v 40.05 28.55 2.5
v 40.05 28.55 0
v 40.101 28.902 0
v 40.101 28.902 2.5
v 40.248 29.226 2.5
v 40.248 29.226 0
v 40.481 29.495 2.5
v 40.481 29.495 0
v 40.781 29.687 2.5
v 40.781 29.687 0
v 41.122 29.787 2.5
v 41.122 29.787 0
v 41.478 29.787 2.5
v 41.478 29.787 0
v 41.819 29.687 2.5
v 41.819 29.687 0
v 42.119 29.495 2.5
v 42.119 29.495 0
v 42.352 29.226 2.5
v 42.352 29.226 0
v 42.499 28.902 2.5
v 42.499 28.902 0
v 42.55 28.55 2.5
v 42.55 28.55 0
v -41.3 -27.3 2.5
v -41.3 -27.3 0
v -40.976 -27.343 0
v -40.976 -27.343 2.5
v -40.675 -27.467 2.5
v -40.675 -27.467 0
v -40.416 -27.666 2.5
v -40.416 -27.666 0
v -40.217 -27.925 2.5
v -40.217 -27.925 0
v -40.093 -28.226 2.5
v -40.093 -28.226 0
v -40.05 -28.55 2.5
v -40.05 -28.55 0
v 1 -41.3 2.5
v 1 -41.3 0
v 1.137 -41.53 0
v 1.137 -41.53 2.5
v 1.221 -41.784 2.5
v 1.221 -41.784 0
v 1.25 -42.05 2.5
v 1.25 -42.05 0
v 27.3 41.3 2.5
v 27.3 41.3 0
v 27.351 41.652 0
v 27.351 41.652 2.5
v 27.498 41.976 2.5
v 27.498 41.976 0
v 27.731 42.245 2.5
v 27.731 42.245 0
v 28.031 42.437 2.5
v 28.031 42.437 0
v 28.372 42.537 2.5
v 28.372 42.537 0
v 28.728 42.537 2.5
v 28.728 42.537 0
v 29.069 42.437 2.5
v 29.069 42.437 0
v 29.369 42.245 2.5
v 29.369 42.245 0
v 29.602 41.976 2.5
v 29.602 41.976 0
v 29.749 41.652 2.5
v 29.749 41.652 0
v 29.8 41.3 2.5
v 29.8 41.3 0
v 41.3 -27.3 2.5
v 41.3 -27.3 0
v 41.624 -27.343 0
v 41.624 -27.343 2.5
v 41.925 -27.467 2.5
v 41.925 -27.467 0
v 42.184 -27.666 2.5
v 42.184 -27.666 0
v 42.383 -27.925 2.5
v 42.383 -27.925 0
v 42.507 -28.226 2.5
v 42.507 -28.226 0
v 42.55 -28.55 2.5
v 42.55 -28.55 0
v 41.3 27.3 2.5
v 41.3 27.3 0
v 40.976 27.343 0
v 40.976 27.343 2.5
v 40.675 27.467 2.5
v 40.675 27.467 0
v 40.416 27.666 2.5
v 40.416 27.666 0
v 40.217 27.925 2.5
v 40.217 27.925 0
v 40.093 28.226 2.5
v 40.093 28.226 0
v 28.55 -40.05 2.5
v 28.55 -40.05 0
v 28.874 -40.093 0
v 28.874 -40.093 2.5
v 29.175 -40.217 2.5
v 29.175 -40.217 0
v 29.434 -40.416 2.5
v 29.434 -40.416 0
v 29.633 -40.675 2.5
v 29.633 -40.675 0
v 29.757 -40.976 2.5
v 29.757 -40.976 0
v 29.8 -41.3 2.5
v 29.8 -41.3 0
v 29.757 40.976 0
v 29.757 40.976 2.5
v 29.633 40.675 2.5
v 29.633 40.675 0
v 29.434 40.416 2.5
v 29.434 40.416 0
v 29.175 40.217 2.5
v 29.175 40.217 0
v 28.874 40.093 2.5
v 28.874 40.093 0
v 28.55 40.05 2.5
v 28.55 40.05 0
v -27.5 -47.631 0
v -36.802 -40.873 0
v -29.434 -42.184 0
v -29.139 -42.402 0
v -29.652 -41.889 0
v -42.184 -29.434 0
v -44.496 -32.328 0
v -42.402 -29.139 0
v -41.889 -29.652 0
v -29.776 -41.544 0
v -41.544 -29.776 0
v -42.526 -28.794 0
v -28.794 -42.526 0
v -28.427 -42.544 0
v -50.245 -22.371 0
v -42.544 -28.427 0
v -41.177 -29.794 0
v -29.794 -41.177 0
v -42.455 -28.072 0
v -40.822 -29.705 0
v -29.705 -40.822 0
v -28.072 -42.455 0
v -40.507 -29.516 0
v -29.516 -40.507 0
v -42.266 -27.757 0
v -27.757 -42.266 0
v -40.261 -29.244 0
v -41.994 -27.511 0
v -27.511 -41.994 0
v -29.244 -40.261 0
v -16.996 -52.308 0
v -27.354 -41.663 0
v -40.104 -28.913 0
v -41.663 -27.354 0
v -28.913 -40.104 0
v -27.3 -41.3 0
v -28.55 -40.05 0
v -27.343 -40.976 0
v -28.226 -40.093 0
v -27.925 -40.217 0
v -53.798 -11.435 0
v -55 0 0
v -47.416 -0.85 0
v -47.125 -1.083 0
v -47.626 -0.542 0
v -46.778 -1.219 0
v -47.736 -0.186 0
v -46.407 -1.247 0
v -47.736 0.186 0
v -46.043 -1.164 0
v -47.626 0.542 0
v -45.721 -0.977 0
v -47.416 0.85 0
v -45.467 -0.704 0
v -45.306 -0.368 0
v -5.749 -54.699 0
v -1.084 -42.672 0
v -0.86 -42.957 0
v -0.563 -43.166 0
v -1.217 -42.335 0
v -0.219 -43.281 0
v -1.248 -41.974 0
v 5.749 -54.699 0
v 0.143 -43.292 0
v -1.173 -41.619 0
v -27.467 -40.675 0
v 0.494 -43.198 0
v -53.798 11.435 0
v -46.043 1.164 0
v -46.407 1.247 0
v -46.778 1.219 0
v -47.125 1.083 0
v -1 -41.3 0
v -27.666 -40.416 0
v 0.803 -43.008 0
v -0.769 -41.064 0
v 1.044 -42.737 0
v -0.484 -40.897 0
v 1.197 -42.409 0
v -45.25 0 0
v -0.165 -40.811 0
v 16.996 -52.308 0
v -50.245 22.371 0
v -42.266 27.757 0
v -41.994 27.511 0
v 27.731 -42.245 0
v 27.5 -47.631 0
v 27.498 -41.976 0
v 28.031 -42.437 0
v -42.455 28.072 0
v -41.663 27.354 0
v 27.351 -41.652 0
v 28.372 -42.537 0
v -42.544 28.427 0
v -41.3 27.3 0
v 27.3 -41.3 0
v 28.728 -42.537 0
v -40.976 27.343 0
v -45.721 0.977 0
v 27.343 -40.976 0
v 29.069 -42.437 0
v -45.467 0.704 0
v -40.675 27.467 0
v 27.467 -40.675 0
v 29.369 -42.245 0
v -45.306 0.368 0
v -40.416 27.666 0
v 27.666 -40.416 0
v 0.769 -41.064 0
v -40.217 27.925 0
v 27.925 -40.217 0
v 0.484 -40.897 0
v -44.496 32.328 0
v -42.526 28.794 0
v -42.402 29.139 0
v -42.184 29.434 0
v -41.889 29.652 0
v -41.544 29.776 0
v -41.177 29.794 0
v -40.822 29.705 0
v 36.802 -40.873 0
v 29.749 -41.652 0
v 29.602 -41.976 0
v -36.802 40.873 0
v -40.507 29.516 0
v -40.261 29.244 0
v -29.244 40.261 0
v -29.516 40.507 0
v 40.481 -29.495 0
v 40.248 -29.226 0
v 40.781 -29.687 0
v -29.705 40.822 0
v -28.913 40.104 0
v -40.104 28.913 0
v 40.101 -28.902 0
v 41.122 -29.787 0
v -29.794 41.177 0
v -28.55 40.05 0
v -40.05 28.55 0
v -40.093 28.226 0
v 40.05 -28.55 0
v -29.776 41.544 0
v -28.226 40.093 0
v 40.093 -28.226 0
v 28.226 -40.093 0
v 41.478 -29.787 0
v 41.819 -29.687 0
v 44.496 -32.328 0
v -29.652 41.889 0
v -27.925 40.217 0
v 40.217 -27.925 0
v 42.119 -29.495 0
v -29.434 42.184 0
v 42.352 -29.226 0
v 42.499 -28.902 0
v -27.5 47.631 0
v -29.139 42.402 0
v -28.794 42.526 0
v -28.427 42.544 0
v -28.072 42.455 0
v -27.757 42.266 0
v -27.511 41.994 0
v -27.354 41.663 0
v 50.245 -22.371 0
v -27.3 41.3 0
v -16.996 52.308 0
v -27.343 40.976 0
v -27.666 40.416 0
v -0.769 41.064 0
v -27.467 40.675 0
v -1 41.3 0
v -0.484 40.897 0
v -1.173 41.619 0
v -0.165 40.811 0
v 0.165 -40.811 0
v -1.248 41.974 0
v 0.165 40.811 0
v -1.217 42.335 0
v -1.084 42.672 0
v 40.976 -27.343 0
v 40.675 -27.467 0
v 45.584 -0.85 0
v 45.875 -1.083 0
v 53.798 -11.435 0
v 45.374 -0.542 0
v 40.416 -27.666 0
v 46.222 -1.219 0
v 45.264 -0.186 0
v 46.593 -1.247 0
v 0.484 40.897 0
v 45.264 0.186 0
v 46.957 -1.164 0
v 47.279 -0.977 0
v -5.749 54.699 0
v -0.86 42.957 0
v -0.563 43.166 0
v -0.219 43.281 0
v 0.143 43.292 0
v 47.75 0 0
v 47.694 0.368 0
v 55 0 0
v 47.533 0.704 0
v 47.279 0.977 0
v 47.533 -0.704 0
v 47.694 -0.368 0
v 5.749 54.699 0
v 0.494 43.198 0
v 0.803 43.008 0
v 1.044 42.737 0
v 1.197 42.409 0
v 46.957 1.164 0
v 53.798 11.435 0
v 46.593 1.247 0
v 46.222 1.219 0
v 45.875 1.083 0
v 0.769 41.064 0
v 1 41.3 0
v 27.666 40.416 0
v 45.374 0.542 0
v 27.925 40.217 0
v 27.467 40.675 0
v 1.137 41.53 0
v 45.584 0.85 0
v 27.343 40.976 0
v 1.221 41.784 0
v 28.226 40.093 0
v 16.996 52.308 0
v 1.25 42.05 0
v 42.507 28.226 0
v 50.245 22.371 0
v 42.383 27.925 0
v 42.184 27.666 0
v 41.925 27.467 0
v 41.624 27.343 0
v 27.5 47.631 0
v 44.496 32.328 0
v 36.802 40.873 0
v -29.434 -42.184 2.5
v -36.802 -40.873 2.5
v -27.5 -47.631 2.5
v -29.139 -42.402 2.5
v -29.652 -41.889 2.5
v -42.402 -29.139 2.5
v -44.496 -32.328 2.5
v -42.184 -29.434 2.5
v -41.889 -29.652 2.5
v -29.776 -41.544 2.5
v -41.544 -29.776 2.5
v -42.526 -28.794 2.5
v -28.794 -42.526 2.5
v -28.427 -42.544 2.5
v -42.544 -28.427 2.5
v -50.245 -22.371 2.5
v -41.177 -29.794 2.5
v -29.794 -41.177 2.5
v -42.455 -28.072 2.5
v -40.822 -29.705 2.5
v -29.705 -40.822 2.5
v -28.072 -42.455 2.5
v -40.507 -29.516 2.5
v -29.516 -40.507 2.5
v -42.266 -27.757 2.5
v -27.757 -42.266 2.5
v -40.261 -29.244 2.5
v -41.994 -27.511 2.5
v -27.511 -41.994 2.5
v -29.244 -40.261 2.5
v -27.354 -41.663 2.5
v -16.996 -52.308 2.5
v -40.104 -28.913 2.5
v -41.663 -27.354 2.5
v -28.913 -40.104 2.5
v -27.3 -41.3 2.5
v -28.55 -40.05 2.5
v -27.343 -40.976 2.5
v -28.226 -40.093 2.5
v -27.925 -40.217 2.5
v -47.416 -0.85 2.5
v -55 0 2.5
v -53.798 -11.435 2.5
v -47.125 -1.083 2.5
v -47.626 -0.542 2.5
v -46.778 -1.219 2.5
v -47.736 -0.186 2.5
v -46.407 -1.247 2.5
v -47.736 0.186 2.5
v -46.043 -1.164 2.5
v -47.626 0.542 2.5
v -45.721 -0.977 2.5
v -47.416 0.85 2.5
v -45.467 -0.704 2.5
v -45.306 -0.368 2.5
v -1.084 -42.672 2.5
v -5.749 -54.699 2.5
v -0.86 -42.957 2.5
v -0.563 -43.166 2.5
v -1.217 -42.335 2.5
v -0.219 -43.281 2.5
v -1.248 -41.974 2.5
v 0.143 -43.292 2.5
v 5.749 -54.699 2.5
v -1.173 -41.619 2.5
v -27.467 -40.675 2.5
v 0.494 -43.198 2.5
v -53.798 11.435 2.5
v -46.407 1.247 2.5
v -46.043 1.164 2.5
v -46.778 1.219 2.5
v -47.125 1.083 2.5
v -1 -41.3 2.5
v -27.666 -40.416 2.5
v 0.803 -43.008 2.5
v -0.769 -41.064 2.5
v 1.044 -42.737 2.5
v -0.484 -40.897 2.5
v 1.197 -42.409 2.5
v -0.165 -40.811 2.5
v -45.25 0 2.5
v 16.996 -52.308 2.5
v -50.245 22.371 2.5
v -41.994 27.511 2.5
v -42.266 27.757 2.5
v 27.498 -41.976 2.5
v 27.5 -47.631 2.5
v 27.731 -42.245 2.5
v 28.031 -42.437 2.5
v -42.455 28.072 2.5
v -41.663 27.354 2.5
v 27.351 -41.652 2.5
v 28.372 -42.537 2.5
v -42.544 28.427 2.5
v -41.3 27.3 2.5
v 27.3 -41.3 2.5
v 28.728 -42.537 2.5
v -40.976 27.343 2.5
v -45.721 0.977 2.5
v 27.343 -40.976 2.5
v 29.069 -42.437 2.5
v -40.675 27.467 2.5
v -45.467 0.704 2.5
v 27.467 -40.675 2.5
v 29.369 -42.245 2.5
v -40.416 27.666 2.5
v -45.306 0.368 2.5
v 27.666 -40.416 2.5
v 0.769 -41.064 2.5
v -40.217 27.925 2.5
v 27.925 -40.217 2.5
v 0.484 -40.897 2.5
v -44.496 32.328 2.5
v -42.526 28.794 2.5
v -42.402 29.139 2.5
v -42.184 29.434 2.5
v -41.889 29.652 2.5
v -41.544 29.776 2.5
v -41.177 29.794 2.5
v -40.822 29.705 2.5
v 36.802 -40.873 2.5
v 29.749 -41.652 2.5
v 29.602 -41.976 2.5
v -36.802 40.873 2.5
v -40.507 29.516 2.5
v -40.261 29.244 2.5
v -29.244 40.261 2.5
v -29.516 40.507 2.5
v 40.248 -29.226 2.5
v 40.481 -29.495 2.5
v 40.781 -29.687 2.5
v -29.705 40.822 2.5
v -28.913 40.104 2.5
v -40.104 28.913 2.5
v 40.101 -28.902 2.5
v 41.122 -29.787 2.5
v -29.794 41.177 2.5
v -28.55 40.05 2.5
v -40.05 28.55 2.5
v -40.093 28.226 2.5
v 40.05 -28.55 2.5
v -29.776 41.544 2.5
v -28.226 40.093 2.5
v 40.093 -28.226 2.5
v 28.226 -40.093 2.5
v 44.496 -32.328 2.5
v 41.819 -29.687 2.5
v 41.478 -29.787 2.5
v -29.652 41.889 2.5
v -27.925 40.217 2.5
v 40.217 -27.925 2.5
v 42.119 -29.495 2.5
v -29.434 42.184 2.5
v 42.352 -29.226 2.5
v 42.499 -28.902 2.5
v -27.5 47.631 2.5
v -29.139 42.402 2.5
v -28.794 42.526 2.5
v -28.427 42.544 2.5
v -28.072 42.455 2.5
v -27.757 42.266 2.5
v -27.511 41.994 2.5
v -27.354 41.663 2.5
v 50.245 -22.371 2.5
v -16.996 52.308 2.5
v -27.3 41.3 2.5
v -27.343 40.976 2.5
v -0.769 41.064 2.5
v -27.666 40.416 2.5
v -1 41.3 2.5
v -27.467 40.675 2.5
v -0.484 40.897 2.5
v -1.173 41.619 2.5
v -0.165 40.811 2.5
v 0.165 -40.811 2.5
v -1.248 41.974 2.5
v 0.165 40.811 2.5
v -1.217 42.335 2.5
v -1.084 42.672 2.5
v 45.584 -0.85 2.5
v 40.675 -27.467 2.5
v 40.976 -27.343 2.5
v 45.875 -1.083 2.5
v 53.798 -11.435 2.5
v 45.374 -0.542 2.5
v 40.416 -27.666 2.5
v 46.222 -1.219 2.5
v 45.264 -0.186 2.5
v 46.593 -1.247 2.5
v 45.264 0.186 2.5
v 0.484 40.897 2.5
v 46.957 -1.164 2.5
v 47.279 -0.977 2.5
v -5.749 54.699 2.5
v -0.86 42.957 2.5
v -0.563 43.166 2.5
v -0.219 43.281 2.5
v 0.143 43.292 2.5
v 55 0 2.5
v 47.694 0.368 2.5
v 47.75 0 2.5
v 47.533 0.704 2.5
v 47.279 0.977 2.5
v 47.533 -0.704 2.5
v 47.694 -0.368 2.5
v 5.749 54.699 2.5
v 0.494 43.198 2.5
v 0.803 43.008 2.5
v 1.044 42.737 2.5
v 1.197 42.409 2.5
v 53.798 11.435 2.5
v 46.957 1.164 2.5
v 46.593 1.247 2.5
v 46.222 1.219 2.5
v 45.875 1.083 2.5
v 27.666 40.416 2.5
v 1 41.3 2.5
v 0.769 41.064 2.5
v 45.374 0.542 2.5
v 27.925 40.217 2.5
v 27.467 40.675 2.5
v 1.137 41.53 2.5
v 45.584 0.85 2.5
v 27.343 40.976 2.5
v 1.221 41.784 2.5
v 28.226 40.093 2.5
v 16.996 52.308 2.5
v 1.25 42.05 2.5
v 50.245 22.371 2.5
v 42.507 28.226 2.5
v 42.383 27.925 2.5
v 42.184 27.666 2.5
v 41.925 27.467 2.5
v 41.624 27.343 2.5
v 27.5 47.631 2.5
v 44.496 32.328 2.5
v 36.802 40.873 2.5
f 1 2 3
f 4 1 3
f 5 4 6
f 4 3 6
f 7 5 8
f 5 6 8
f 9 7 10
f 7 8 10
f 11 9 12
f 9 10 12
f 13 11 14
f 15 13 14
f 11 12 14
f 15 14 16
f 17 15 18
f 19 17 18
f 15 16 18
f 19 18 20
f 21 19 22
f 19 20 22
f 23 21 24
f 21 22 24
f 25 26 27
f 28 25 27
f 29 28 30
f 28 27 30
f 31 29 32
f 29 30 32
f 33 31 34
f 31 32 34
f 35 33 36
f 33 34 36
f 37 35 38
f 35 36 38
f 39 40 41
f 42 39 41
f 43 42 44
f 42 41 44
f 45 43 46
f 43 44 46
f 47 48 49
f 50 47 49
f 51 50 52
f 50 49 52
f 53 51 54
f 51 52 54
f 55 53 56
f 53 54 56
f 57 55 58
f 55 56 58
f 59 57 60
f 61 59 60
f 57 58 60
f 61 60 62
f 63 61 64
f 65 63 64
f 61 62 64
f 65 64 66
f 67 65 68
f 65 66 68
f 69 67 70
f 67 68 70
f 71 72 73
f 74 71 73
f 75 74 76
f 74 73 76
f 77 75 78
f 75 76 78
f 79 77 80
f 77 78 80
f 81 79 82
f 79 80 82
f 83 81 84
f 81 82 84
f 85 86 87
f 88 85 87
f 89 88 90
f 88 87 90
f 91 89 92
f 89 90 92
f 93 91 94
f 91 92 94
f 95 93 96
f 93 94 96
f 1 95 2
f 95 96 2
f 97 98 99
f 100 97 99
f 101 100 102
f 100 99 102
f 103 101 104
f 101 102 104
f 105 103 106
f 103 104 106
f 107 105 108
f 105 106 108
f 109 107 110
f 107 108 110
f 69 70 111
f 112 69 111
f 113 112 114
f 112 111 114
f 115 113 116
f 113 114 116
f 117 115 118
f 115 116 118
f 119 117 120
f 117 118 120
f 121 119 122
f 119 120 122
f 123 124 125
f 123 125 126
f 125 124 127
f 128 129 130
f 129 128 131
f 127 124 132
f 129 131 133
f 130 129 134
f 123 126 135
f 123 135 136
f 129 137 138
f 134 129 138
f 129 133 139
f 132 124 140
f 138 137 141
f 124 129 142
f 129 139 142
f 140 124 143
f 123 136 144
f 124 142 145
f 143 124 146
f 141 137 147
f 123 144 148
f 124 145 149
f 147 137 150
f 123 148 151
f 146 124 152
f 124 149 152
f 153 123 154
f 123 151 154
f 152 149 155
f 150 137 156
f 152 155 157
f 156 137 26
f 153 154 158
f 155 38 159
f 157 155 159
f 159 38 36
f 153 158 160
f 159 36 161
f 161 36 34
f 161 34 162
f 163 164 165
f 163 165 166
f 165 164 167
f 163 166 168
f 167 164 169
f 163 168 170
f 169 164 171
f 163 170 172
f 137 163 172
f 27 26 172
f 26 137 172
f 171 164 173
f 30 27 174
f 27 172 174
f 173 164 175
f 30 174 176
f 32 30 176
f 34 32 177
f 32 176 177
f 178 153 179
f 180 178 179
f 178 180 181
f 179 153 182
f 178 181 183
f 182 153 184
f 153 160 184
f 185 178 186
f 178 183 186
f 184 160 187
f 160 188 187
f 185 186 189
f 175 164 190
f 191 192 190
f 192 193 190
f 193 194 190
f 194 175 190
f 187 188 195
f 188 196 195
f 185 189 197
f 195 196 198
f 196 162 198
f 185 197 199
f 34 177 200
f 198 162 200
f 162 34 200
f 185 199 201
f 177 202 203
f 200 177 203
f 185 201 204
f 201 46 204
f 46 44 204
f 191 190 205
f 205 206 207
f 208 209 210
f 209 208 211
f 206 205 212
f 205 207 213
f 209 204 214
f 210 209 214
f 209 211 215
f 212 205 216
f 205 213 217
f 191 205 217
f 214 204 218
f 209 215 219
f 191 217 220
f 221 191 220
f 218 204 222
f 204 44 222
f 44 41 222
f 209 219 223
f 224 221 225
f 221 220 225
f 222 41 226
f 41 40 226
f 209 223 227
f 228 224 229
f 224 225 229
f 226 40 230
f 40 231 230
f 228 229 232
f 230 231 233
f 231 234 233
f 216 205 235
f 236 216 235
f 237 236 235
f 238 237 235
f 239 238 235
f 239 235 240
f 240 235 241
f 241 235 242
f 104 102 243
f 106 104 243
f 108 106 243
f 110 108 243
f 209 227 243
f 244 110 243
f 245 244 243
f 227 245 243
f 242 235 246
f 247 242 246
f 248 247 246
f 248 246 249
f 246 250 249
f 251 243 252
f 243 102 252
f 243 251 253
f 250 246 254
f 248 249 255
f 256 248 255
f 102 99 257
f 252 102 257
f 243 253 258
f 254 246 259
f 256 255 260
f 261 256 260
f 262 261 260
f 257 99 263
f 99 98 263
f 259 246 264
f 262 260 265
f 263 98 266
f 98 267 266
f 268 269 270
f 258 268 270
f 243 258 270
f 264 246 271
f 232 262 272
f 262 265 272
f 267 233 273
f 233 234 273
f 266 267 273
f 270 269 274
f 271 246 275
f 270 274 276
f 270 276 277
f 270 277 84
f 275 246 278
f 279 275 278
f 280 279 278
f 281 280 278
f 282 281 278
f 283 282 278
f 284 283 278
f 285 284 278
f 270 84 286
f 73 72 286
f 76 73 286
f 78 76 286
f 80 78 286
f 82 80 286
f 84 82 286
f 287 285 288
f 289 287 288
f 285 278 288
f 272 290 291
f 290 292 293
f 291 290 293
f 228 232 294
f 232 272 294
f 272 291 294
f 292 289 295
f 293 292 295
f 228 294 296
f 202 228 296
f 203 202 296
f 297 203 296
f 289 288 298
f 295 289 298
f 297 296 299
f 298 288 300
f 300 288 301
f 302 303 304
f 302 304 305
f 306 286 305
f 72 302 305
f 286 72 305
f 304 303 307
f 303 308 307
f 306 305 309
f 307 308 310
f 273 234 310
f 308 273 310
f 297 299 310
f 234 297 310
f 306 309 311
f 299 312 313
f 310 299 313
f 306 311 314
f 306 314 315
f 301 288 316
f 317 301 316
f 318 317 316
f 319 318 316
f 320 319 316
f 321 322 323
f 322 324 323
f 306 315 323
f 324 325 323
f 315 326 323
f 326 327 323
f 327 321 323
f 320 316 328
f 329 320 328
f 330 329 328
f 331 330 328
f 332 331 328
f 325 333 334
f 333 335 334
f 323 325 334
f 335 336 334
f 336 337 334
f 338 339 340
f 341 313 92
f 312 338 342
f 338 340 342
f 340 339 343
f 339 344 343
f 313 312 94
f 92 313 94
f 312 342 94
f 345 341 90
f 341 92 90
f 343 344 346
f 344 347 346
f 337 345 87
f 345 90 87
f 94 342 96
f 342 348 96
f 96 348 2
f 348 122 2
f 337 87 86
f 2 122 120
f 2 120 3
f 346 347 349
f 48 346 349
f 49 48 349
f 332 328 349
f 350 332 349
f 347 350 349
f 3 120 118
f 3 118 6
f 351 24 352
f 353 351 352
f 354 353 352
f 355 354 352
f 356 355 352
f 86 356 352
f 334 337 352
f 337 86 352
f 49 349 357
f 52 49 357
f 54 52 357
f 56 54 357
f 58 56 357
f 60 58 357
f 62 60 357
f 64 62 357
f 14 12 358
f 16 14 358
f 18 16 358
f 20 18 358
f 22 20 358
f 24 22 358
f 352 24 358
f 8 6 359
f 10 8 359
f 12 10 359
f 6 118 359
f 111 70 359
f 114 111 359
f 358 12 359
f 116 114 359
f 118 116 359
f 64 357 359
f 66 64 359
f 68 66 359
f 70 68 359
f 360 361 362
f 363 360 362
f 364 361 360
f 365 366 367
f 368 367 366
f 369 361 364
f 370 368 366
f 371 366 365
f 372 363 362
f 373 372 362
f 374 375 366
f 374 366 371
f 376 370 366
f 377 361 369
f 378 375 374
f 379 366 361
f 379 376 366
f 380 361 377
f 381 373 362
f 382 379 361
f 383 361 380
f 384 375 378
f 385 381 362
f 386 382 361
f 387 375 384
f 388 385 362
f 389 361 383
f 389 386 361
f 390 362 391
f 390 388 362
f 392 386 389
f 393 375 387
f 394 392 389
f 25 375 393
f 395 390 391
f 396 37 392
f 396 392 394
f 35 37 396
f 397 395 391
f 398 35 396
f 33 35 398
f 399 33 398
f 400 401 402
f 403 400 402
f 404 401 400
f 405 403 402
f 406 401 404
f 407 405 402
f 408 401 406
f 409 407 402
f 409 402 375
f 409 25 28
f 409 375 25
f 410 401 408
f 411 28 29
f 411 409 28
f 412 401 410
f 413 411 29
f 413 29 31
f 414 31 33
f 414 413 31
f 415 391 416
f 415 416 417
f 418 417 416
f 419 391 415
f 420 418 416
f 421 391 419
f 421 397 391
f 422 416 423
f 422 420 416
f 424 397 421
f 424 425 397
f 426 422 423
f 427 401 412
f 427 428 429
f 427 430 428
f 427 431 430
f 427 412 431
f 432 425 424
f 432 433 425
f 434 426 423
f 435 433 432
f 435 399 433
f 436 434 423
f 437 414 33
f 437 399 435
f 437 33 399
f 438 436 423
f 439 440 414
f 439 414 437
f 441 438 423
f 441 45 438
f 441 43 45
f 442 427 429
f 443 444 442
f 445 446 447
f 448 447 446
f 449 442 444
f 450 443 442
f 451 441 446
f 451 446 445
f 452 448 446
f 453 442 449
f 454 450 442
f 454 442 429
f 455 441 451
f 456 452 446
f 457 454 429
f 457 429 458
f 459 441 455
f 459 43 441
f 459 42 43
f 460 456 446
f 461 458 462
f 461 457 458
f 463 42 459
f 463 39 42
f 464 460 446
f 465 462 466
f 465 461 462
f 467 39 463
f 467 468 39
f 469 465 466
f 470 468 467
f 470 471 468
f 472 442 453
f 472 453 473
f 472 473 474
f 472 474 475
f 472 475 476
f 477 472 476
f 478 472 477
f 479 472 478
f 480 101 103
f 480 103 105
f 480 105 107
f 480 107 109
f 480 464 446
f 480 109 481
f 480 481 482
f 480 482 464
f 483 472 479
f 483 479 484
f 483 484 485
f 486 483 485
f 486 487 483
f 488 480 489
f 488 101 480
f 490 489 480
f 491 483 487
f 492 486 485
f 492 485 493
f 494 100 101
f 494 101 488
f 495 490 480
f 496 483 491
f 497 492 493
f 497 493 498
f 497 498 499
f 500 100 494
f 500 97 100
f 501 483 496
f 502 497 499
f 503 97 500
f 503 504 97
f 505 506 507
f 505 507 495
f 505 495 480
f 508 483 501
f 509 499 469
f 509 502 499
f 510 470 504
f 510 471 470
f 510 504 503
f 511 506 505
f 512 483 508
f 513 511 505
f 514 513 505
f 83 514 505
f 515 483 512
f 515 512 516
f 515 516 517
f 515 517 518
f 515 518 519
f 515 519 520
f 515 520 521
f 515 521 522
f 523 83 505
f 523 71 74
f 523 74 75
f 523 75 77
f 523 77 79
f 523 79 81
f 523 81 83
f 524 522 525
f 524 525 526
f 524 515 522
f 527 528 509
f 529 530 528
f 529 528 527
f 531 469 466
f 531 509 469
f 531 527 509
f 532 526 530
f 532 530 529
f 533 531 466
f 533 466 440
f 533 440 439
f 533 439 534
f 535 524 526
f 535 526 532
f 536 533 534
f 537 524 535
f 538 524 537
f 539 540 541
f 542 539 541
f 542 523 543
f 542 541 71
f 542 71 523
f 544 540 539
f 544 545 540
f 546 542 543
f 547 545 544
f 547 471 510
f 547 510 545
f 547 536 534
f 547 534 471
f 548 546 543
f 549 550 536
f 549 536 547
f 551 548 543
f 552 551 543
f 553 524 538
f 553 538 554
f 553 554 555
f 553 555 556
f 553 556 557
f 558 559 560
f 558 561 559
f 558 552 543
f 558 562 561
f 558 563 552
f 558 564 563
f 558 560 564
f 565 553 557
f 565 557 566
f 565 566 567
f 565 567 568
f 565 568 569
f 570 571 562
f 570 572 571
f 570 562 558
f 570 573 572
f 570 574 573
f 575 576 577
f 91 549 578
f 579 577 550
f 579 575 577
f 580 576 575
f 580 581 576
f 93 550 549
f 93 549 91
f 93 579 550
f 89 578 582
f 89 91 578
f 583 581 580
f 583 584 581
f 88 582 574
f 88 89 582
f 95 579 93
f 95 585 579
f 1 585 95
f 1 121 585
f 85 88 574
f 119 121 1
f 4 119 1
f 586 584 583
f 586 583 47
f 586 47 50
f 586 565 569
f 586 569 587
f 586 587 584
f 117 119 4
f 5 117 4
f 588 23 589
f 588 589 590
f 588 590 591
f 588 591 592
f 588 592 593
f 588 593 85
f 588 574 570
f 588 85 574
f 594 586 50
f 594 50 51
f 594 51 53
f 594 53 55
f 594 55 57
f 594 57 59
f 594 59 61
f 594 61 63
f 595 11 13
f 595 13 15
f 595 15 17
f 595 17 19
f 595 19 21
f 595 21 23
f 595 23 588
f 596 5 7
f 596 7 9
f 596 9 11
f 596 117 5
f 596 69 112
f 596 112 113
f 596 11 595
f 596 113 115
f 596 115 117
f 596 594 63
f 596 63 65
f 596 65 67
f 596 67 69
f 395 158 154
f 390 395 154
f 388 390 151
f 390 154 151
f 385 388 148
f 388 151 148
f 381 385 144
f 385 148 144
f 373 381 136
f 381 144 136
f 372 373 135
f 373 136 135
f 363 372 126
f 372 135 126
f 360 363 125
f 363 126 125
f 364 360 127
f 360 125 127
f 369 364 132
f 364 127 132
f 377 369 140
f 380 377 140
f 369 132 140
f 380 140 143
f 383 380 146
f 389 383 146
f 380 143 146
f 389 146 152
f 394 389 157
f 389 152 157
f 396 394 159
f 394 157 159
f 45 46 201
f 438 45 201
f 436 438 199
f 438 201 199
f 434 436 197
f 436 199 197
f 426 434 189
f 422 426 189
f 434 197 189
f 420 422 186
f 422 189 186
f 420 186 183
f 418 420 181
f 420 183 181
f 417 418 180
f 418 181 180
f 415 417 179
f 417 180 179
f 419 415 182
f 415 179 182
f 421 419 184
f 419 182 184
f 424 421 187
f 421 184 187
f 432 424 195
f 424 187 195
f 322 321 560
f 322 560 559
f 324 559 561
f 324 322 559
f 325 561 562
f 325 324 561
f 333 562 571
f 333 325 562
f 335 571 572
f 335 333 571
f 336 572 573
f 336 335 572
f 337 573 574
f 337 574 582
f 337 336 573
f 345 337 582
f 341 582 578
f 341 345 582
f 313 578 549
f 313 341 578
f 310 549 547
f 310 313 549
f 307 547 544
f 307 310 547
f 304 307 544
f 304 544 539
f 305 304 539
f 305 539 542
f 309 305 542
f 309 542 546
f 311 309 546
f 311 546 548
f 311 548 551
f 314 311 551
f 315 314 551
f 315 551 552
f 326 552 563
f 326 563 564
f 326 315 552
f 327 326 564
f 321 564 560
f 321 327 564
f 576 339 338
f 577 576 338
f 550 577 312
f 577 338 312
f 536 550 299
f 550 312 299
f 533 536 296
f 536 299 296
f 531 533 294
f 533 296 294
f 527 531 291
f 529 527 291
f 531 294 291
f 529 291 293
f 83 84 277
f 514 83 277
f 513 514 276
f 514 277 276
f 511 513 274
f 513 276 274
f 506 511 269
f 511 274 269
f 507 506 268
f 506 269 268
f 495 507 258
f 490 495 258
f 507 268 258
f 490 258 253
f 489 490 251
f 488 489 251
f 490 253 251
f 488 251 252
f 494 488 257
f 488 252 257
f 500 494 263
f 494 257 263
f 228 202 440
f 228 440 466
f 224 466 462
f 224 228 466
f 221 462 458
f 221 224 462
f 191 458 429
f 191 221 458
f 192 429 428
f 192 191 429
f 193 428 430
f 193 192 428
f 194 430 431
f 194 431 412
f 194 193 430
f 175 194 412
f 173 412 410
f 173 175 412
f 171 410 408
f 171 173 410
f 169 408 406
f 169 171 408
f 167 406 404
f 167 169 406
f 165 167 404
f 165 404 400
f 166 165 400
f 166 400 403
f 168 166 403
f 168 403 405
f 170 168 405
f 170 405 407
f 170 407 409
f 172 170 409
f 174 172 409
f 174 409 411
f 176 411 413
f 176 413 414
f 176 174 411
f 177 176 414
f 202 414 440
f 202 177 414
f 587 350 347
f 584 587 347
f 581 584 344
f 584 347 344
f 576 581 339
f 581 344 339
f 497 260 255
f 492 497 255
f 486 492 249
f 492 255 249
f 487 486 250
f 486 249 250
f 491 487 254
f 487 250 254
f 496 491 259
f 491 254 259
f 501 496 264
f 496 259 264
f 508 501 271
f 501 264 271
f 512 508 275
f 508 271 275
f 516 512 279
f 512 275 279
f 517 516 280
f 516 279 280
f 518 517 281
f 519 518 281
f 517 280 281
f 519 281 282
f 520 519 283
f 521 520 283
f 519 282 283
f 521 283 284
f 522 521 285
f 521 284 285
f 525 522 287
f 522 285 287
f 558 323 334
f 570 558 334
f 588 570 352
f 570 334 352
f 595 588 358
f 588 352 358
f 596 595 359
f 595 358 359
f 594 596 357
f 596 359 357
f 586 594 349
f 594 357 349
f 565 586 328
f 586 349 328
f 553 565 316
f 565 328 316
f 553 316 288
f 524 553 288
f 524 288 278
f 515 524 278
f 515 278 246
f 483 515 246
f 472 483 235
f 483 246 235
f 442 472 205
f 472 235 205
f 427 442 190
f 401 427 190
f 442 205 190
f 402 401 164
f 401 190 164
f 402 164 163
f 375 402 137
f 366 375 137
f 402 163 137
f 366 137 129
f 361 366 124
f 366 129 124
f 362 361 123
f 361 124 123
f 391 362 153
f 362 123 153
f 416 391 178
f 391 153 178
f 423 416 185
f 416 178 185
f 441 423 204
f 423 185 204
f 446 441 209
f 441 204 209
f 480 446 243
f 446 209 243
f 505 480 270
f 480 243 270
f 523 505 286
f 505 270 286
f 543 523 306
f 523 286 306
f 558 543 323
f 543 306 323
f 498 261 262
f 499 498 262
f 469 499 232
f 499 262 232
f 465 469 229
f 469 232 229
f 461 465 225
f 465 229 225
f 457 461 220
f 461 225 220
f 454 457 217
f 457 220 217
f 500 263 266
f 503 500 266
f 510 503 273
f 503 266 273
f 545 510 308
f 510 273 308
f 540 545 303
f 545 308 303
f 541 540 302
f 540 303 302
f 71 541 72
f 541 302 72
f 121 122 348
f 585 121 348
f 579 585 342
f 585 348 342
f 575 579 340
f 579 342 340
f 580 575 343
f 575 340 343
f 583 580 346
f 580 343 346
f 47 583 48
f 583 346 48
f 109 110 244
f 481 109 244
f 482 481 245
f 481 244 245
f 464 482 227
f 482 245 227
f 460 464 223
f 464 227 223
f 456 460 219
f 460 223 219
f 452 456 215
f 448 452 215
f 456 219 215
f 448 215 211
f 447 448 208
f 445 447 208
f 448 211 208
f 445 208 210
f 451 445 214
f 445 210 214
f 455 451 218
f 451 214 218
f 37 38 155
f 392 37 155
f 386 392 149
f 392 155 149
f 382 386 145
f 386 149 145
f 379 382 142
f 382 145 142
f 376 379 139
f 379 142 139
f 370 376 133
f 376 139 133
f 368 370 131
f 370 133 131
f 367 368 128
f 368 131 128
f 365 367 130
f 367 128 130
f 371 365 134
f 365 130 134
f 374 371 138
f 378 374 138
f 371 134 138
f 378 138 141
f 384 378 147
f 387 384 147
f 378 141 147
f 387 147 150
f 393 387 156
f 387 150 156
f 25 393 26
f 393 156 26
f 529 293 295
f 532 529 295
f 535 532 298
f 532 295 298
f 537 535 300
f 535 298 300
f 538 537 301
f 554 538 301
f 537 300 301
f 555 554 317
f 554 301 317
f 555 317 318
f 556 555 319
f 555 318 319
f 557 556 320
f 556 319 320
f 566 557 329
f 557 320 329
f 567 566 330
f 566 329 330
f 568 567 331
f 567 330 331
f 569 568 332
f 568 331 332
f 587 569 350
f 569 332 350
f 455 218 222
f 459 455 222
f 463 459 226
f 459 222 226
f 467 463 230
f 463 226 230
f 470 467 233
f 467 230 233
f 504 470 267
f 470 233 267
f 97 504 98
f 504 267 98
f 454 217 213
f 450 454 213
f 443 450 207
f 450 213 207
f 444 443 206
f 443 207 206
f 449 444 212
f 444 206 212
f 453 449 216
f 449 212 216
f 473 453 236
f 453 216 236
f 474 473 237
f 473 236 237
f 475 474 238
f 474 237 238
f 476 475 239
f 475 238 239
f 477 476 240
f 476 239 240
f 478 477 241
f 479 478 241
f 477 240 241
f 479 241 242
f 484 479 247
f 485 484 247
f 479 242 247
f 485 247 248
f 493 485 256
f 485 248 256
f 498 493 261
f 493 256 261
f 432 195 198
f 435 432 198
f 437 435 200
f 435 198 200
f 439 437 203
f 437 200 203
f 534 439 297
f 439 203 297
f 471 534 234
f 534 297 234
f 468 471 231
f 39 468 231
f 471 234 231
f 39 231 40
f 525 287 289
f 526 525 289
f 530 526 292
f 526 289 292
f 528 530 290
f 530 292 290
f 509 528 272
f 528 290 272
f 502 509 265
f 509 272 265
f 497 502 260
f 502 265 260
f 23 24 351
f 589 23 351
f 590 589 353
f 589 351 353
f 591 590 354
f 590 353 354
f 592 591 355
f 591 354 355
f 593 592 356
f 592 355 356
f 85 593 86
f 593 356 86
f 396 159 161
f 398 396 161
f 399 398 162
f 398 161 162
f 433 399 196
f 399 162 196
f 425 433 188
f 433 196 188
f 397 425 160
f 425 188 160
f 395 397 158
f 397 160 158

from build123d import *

# Parameters (mm, degrees)
F0_R     = 55
F0_R_2   = 1.25
F0_W     = 57.1
F0_H     = 57.1
F1_DEPTH = 2.5


with BuildPart() as f1:
    # F0 (on Top) → F1 (new body)
    with BuildSketch(Plane.XY):
        Circle(F0_R)
        with Locations((-46.5, 0)):
            Circle(F0_R_2, mode=Mode.SUBTRACT)
        with BuildLine():
            ThreePointArc((1, -41.3), (1.1858541226, -41.6547152925), (1.25, -42.05))
            ThreePointArc((1.25, -42.05), (-0.3952847075, -43.2358541226), (-1, -41.3))
            Line((-1, -41.3), (-27.3, -41.3))
            ThreePointArc((-27.3, -41.3), (-29.4338834765, -42.1838834765), (-28.55, -40.05))
            Line((-28.55, -40.05), (-28.55, -28.55))
            Line((-28.55, -28.55), (-40.05, -28.55))
            ThreePointArc((-40.05, -28.55), (-42.1838834765, -29.4338834765), (-41.3, -27.3))
            Line((-41.3, -27.3), (-41.3, 27.3))
            ThreePointArc((-41.3, 27.3), (-42.1838834765, 29.4338834765), (-40.05, 28.55))
            Line((-40.05, 28.55), (-28.55, 28.55))
            Line((-28.55, 28.55), (-28.55, 40.05))
            ThreePointArc((-28.55, 40.05), (-29.4338834765, 42.1838834765), (-27.3, 41.3))
            Line((-27.3, 41.3), (-1, 41.3))
            ThreePointArc((-1, 41.3), (-0.3952847075, 43.2358541226), (1.25, 42.05))
            ThreePointArc((1.25, 42.05), (1.1858541226, 41.6547152925), (1, 41.3))
            Line((1, 41.3), (27.3, 41.3))
            ThreePointArc((27.3, 41.3), (28.55, 42.55), (29.8, 41.3))
            ThreePointArc((29.8, 41.3), (29.4338834765, 40.4161165235), (28.55, 40.05))
            Line((28.55, 40.05), (28.55, 28.55))
            Line((28.55, 28.55), (40.05, 28.55))
            ThreePointArc((40.05, 28.55), (41.3, 29.8), (42.55, 28.55))
            ThreePointArc((42.55, 28.55), (42.1838834765, 27.6661165235), (41.3, 27.3))
            Line((41.3, 27.3), (41.3, -27.3))
            ThreePointArc((41.3, -27.3), (42.1838834765, -27.6661165235), (42.55, -28.55))
            ThreePointArc((42.55, -28.55), (41.3, -29.8), (40.05, -28.55))
            Line((40.05, -28.55), (28.55, -28.55))
            Line((28.55, -28.55), (28.55, -40.05))
            ThreePointArc((28.55, -40.05), (29.4338834765, -40.4161165235), (29.8, -41.3))
            ThreePointArc((29.8, -41.3), (28.55, -42.55), (27.3, -41.3))
            Line((27.3, -41.3), (1, -41.3))
        make_face(mode=Mode.SUBTRACT)
        with Locations((46.5, 0)):
            Circle(F0_R_2, mode=Mode.SUBTRACT)
        with BuildLine():
            Line((-28.55, 28.55), (28.55, 28.55))
            Line((28.55, 28.55), (28.55, 40.05))
            ThreePointArc((28.55, 40.05), (27.6661165235, 40.4161165235), (27.3, 41.3))
            Line((27.3, 41.3), (1, 41.3))
            ThreePointArc((1, 41.3), (0, 40.8), (-1, 41.3))
            Line((-1, 41.3), (-27.3, 41.3))
            ThreePointArc((-27.3, 41.3), (-27.6661165235, 40.4161165235), (-28.55, 40.05))
            Line((-28.55, 40.05), (-28.55, 28.55))
        make_face()
        Rectangle(F0_W, F0_H)
        with BuildLine():
            Line((-40.05, -28.55), (-28.55, -28.55))
            Line((-28.55, -28.55), (-28.55, 28.55))
            Line((-28.55, 28.55), (-40.05, 28.55))
            ThreePointArc((-40.05, 28.55), (-40.4161165235, 27.6661165235), (-41.3, 27.3))
            Line((-41.3, 27.3), (-41.3, -27.3))
            ThreePointArc((-41.3, -27.3), (-40.4161165235, -27.6661165235), (-40.05, -28.55))
        make_face()
        with BuildLine():
            ThreePointArc((-1, -41.3), (0, -40.8), (1, -41.3))
            Line((1, -41.3), (27.3, -41.3))
            ThreePointArc((27.3, -41.3), (27.6661165235, -40.4161165235), (28.55, -40.05))
            Line((28.55, -40.05), (28.55, -28.55))
            Line((28.55, -28.55), (-28.55, -28.55))
            Line((-28.55, -28.55), (-28.55, -40.05))
            ThreePointArc((-28.55, -40.05), (-27.6661165235, -40.4161165235), (-27.3, -41.3))
            Line((-27.3, -41.3), (-1, -41.3))
        make_face()
        with BuildLine():
            Line((28.55, 28.55), (28.55, -28.55))
            Line((28.55, -28.55), (40.05, -28.55))
            ThreePointArc((40.05, -28.55), (40.4161165235, -27.6661165235), (41.3, -27.3))
            Line((41.3, -27.3), (41.3, 27.3))
            ThreePointArc((41.3, 27.3), (40.4161165235, 27.6661165235), (40.05, 28.55))
            Line((40.05, 28.55), (28.55, 28.55))
        make_face()
    extrude(amount=F1_DEPTH)


solid = f1.part
